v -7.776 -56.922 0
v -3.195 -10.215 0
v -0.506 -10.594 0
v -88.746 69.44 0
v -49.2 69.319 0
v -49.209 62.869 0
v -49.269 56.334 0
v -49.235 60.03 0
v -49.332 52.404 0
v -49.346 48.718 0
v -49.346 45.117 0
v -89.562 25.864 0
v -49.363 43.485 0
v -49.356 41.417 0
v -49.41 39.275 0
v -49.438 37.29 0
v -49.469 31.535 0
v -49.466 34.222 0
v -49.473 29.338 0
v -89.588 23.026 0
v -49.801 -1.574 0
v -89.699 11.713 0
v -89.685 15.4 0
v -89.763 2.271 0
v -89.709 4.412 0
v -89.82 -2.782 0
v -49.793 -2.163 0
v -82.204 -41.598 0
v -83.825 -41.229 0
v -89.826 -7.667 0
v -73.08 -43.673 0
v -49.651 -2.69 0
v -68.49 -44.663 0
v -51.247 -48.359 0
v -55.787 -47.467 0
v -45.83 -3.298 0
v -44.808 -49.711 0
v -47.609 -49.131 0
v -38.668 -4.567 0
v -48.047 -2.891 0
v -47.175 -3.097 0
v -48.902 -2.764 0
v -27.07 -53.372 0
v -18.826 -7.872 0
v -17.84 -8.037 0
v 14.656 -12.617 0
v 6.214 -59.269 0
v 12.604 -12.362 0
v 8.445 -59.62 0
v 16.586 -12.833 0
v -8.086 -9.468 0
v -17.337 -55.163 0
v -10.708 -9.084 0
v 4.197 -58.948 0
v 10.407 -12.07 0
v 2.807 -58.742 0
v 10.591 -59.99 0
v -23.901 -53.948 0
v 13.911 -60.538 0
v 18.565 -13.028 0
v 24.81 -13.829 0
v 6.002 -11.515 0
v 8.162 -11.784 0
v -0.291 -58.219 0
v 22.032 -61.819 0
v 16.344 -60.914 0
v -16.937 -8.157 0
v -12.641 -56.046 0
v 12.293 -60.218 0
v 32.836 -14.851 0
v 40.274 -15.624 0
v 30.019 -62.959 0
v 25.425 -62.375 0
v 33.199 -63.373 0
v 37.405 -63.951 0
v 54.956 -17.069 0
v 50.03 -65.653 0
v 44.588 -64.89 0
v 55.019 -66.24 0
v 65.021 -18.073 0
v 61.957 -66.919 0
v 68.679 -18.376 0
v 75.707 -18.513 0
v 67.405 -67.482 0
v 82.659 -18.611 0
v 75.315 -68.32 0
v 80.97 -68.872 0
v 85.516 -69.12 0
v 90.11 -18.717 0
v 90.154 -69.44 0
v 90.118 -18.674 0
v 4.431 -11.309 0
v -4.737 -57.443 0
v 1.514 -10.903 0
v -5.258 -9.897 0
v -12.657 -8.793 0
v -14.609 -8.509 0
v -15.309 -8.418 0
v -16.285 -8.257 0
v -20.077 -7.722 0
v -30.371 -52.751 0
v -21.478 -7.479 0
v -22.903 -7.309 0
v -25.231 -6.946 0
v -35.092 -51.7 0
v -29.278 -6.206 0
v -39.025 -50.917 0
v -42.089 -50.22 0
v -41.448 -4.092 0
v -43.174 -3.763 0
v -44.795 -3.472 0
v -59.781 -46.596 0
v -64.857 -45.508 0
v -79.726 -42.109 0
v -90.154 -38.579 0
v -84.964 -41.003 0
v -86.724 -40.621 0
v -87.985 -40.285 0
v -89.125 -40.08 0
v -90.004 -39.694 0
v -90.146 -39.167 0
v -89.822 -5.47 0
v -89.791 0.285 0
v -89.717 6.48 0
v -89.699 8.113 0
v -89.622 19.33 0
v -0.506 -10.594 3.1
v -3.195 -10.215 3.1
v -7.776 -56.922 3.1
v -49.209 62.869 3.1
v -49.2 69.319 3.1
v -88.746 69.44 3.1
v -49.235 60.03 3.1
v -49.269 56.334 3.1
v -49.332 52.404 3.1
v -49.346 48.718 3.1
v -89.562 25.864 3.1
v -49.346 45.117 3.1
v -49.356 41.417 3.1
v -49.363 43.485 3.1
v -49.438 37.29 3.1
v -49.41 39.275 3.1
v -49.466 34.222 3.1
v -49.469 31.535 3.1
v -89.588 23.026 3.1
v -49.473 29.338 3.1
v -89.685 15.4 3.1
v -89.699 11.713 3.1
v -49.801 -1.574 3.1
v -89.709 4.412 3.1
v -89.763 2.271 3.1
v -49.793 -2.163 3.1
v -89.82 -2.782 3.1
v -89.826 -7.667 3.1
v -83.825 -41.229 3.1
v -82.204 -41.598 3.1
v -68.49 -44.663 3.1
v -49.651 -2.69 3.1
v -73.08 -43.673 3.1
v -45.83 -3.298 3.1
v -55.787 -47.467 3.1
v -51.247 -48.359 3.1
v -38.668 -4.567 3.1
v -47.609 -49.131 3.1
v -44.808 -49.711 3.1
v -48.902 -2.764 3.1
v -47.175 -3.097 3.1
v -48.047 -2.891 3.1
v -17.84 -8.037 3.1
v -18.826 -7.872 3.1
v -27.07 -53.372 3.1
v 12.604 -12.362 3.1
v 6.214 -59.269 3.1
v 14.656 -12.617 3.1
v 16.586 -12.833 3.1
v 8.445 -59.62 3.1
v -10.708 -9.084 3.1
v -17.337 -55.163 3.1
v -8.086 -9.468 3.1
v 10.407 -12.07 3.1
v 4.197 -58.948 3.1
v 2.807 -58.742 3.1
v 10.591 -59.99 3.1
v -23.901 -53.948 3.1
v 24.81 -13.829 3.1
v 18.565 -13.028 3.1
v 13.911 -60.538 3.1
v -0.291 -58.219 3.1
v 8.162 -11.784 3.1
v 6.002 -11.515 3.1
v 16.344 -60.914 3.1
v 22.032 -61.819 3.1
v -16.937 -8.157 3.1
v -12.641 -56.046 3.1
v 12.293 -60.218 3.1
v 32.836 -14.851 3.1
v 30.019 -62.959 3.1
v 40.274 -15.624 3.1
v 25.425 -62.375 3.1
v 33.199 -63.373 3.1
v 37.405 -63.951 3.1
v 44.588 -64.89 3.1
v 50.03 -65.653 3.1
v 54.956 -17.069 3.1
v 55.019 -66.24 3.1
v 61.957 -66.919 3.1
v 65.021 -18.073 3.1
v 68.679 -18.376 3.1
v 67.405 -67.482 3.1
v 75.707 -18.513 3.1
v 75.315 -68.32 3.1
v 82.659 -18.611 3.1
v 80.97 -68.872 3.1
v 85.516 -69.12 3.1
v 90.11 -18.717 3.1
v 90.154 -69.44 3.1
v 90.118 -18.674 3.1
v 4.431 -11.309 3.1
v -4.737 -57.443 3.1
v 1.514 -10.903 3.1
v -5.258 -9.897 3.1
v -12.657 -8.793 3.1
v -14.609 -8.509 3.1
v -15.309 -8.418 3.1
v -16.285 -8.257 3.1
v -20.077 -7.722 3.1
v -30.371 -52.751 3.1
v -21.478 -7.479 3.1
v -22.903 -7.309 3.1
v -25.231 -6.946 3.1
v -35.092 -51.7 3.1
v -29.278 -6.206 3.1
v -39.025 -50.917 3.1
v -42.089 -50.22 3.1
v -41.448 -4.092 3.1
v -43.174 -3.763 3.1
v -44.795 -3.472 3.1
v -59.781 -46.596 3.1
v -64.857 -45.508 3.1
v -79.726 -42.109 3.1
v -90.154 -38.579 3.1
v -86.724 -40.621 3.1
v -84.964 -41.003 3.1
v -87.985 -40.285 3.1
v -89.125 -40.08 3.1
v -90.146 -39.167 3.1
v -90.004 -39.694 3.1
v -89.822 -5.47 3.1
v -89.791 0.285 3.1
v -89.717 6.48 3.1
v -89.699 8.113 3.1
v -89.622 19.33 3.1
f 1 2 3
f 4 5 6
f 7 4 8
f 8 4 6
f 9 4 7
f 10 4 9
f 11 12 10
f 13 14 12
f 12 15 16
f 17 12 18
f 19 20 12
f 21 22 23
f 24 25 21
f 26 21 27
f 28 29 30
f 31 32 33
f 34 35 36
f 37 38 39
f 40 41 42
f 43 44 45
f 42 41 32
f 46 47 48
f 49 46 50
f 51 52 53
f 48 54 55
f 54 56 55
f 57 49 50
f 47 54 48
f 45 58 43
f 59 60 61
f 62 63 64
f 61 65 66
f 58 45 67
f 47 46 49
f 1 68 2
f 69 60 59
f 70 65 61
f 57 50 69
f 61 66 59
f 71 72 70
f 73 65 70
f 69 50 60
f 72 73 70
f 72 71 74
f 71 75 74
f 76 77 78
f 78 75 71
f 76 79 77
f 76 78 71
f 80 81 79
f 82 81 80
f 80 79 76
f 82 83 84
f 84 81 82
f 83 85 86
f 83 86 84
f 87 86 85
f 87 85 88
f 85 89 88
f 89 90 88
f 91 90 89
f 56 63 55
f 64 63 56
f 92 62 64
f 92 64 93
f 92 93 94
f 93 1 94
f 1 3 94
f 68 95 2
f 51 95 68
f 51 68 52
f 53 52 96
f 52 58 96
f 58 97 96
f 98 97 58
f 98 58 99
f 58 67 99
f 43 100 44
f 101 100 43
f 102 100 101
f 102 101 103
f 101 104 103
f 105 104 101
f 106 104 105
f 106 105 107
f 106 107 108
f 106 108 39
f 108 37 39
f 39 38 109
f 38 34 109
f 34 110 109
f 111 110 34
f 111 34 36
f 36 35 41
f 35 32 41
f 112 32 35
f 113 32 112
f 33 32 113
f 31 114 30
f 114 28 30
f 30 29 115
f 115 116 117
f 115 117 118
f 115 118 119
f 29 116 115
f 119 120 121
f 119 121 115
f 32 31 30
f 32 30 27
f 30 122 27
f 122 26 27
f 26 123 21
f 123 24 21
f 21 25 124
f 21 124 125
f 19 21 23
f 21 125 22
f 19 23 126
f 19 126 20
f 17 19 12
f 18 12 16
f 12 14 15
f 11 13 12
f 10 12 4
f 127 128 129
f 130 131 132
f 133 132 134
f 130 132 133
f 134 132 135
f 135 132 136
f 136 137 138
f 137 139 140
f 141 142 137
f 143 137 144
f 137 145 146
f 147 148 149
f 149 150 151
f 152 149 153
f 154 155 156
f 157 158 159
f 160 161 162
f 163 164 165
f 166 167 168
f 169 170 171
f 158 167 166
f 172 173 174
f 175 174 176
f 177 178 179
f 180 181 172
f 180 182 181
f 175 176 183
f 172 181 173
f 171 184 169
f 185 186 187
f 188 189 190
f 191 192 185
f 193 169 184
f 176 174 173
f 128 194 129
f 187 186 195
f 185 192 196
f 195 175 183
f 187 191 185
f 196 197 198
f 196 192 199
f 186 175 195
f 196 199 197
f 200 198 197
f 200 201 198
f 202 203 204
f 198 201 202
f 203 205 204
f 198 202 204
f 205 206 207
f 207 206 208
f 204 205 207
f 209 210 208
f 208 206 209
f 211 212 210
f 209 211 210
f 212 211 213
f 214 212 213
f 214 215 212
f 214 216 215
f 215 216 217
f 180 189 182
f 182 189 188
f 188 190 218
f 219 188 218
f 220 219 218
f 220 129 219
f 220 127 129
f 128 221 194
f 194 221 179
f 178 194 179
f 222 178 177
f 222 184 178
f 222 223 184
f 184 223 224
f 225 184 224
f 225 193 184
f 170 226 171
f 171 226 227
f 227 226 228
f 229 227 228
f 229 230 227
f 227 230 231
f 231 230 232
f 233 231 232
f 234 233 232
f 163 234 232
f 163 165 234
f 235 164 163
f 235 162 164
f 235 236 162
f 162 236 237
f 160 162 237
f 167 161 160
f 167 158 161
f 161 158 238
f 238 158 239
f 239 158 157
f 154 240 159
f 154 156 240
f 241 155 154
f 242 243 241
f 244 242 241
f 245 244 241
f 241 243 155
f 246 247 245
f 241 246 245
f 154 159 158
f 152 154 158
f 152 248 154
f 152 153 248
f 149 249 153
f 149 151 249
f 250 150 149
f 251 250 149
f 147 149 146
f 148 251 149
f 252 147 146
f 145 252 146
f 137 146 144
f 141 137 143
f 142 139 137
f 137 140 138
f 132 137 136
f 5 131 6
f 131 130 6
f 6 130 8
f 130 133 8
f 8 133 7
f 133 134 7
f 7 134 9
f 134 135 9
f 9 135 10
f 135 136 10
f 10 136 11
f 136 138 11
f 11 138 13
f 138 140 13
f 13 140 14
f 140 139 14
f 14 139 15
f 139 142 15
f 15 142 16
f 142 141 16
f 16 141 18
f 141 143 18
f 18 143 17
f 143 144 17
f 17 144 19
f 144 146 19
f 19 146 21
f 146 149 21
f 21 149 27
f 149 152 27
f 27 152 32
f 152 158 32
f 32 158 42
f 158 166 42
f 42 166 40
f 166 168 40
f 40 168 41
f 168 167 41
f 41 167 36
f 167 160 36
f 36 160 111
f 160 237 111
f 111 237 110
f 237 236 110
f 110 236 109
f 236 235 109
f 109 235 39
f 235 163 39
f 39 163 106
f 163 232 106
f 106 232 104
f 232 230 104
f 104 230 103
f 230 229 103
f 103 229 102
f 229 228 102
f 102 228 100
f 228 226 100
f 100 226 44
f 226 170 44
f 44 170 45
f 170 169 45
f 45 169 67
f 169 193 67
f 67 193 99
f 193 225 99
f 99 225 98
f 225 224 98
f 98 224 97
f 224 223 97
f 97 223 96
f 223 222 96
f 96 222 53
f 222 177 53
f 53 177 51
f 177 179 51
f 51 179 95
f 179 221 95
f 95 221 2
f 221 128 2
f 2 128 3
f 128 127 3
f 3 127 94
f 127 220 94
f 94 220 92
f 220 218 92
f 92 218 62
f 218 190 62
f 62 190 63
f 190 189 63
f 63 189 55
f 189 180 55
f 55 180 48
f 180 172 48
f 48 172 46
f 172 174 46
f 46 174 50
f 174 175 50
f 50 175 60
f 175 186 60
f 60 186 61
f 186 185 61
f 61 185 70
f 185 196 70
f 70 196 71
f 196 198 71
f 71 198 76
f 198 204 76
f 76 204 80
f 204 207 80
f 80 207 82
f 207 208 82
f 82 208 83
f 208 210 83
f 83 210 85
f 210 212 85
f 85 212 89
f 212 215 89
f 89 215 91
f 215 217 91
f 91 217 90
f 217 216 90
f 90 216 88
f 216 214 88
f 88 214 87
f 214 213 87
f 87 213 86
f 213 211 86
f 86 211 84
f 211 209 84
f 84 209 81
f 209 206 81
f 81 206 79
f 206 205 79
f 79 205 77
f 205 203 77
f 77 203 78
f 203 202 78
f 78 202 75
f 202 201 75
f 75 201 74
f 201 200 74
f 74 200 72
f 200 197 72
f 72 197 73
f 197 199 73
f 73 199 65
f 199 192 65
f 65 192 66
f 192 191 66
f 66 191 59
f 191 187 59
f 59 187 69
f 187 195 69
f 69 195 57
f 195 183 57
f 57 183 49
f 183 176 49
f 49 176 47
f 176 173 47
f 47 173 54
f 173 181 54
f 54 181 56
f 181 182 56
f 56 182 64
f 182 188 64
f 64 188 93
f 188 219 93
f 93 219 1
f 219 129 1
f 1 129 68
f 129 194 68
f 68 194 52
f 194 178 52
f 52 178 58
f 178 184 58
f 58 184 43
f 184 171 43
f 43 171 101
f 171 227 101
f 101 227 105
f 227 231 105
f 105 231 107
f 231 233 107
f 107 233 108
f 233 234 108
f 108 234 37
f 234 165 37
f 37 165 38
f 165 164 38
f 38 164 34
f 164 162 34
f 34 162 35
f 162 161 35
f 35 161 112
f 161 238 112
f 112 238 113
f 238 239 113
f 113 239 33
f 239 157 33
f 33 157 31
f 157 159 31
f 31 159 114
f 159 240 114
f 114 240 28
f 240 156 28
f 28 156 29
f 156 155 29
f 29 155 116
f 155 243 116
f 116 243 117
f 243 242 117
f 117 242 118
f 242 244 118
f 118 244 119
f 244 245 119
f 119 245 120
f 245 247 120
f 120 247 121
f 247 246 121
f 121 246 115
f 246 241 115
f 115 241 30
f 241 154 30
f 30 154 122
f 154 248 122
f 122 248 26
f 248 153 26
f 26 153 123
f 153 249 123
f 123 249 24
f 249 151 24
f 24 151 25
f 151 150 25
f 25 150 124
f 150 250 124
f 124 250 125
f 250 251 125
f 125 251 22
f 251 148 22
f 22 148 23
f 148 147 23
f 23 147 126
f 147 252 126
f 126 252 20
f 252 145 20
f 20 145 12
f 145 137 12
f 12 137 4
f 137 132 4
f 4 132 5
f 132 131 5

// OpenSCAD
// Module names are of the form poly_<inkscape-path-id>().  As a result,
// you can associate a polygon in this OpenSCAD program with the corresponding
// SVG element in the Inkscape document by looking for the XML element with
// the attribute id="inkscape-path-id".

// fudge value is used to ensure that subtracted solids are a tad taller
// in the z dimension than the polygon being subtracted from.  This helps
// keep the resulting .stl file manifold.
fudge = 0.1;

module i3omegaframe(h)
{
  scale([25.4/90, -25.4/90, 1]) union()
  {
    linear_extrude(height=h)
      polygon([[319.315935,66.166950],[319.287135,66.319250],[292.887105,65.946150],[268.253695,65.597950],[243.349545,65.111450],[230.387645,64.037050],[194.727215,60.480950],[142.703095,55.359650],[116.349725,52.622650],[87.910005,48.998650],[65.781035,46.160650],[58.768095,45.471850],[51.932495,44.706250],[44.660085,43.803650],[36.873705,42.767850],[28.920385,41.754050],[21.268415,40.802650],[15.701215,40.071750],[5.366315,38.632350],[-1.793185,37.538550],[-11.322185,36.195250],[-18.630485,35.068350],[-28.652485,33.549650],[-37.940685,32.186350],[-44.848685,31.154850],[-51.764785,30.148650],[-54.246085,29.826650],[-57.704085,29.257650],[-60.011585,28.901350],[-63.212185,28.476950],[-66.705785,27.892550],[-71.139785,27.362150],[-76.103685,26.501450],[-81.153886,25.896650],[-89.399885,24.613150],[-103.742285,21.988150],[-137.011185,16.182750],[-146.864085,14.500650],[-152.979485,13.333350],[-158.722885,12.302250],[-162.389085,11.687050],[-167.156586,10.974950],[-170.246486,10.245350],[-173.274086,9.794850],[-175.929886,9.529950],[-176.431185,7.662950],[-176.461185,5.577050],[-175.296685,-103.953750],[-175.284685,-111.737550],[-175.274686,-121.260050],[-175.174086,-132.129050],[-175.074086,-139.164750],[-174.882886,-146.753150],[-174.909886,-154.081050],[-174.846886,-159.864850],[-174.846886,-172.621650],[-174.798886,-185.684650],[-174.573786,-199.610050],[-174.453486,-212.705950],[-174.361486,-222.763450],[-174.330486,-245.618450],[-314.453885,-246.047050],[-317.345084,-91.644450],[-317.437085,-81.586850],[-317.557385,-68.490950],[-317.782485,-54.565550],[-317.830485,-41.502650],[-317.830485,-28.745850],[-317.893484,-22.961950],[-317.866485,-15.634050],[-318.057585,-8.045650],[-318.157584,-1.009950],[-318.258084,9.858950],[-318.268084,19.381450],[-318.280084,27.165350],[-319.444585,136.696150],[-319.414584,138.781950],[-318.913285,140.648950],[-315.797885,142.016850],[-311.759285,142.743150],[-307.290684,143.932250],[-301.052484,145.287850],[-297.018685,146.086850],[-291.275284,147.393750],[-282.494284,149.204450],[-258.945986,154.746950],[-242.681486,158.254550],[-229.809686,161.247150],[-211.820685,165.104250],[-197.670885,168.190750],[-181.585185,171.349350],[-168.694986,174.085750],[-158.767286,176.140750],[-149.132686,177.943950],[-138.277085,180.414250],[-124.340686,183.189150],[-107.612586,186.912050],[-95.916886,189.113150],[-84.688886,191.155750],[-61.429486,195.460350],[-44.789586,198.587550],[-27.554386,201.690650],[-16.784586,203.539450],[-1.030986,206.287650],[9.947314,208.140750],[14.871114,208.871650],[22.017514,210.006850],[29.924864,211.250450],[37.527414,212.561950],[43.558974,213.372650],[49.291604,214.505950],[57.913054,215.838150],[78.065834,219.043850],[90.089294,221.015050],[106.367674,223.081450],[117.632894,224.549950],[132.537204,226.599750],[157.990064,229.925350],[177.271854,232.627950],[194.947724,234.708250],[219.532364,237.115450],[238.836425,239.108950],[266.865695,242.077250],[277.128625,243.079450],[286.903345,244.033950],[303.008854,244.912550],[319.444585,246.047050]]);
  }
}

i3omegaframe(3.0999999046325684);
